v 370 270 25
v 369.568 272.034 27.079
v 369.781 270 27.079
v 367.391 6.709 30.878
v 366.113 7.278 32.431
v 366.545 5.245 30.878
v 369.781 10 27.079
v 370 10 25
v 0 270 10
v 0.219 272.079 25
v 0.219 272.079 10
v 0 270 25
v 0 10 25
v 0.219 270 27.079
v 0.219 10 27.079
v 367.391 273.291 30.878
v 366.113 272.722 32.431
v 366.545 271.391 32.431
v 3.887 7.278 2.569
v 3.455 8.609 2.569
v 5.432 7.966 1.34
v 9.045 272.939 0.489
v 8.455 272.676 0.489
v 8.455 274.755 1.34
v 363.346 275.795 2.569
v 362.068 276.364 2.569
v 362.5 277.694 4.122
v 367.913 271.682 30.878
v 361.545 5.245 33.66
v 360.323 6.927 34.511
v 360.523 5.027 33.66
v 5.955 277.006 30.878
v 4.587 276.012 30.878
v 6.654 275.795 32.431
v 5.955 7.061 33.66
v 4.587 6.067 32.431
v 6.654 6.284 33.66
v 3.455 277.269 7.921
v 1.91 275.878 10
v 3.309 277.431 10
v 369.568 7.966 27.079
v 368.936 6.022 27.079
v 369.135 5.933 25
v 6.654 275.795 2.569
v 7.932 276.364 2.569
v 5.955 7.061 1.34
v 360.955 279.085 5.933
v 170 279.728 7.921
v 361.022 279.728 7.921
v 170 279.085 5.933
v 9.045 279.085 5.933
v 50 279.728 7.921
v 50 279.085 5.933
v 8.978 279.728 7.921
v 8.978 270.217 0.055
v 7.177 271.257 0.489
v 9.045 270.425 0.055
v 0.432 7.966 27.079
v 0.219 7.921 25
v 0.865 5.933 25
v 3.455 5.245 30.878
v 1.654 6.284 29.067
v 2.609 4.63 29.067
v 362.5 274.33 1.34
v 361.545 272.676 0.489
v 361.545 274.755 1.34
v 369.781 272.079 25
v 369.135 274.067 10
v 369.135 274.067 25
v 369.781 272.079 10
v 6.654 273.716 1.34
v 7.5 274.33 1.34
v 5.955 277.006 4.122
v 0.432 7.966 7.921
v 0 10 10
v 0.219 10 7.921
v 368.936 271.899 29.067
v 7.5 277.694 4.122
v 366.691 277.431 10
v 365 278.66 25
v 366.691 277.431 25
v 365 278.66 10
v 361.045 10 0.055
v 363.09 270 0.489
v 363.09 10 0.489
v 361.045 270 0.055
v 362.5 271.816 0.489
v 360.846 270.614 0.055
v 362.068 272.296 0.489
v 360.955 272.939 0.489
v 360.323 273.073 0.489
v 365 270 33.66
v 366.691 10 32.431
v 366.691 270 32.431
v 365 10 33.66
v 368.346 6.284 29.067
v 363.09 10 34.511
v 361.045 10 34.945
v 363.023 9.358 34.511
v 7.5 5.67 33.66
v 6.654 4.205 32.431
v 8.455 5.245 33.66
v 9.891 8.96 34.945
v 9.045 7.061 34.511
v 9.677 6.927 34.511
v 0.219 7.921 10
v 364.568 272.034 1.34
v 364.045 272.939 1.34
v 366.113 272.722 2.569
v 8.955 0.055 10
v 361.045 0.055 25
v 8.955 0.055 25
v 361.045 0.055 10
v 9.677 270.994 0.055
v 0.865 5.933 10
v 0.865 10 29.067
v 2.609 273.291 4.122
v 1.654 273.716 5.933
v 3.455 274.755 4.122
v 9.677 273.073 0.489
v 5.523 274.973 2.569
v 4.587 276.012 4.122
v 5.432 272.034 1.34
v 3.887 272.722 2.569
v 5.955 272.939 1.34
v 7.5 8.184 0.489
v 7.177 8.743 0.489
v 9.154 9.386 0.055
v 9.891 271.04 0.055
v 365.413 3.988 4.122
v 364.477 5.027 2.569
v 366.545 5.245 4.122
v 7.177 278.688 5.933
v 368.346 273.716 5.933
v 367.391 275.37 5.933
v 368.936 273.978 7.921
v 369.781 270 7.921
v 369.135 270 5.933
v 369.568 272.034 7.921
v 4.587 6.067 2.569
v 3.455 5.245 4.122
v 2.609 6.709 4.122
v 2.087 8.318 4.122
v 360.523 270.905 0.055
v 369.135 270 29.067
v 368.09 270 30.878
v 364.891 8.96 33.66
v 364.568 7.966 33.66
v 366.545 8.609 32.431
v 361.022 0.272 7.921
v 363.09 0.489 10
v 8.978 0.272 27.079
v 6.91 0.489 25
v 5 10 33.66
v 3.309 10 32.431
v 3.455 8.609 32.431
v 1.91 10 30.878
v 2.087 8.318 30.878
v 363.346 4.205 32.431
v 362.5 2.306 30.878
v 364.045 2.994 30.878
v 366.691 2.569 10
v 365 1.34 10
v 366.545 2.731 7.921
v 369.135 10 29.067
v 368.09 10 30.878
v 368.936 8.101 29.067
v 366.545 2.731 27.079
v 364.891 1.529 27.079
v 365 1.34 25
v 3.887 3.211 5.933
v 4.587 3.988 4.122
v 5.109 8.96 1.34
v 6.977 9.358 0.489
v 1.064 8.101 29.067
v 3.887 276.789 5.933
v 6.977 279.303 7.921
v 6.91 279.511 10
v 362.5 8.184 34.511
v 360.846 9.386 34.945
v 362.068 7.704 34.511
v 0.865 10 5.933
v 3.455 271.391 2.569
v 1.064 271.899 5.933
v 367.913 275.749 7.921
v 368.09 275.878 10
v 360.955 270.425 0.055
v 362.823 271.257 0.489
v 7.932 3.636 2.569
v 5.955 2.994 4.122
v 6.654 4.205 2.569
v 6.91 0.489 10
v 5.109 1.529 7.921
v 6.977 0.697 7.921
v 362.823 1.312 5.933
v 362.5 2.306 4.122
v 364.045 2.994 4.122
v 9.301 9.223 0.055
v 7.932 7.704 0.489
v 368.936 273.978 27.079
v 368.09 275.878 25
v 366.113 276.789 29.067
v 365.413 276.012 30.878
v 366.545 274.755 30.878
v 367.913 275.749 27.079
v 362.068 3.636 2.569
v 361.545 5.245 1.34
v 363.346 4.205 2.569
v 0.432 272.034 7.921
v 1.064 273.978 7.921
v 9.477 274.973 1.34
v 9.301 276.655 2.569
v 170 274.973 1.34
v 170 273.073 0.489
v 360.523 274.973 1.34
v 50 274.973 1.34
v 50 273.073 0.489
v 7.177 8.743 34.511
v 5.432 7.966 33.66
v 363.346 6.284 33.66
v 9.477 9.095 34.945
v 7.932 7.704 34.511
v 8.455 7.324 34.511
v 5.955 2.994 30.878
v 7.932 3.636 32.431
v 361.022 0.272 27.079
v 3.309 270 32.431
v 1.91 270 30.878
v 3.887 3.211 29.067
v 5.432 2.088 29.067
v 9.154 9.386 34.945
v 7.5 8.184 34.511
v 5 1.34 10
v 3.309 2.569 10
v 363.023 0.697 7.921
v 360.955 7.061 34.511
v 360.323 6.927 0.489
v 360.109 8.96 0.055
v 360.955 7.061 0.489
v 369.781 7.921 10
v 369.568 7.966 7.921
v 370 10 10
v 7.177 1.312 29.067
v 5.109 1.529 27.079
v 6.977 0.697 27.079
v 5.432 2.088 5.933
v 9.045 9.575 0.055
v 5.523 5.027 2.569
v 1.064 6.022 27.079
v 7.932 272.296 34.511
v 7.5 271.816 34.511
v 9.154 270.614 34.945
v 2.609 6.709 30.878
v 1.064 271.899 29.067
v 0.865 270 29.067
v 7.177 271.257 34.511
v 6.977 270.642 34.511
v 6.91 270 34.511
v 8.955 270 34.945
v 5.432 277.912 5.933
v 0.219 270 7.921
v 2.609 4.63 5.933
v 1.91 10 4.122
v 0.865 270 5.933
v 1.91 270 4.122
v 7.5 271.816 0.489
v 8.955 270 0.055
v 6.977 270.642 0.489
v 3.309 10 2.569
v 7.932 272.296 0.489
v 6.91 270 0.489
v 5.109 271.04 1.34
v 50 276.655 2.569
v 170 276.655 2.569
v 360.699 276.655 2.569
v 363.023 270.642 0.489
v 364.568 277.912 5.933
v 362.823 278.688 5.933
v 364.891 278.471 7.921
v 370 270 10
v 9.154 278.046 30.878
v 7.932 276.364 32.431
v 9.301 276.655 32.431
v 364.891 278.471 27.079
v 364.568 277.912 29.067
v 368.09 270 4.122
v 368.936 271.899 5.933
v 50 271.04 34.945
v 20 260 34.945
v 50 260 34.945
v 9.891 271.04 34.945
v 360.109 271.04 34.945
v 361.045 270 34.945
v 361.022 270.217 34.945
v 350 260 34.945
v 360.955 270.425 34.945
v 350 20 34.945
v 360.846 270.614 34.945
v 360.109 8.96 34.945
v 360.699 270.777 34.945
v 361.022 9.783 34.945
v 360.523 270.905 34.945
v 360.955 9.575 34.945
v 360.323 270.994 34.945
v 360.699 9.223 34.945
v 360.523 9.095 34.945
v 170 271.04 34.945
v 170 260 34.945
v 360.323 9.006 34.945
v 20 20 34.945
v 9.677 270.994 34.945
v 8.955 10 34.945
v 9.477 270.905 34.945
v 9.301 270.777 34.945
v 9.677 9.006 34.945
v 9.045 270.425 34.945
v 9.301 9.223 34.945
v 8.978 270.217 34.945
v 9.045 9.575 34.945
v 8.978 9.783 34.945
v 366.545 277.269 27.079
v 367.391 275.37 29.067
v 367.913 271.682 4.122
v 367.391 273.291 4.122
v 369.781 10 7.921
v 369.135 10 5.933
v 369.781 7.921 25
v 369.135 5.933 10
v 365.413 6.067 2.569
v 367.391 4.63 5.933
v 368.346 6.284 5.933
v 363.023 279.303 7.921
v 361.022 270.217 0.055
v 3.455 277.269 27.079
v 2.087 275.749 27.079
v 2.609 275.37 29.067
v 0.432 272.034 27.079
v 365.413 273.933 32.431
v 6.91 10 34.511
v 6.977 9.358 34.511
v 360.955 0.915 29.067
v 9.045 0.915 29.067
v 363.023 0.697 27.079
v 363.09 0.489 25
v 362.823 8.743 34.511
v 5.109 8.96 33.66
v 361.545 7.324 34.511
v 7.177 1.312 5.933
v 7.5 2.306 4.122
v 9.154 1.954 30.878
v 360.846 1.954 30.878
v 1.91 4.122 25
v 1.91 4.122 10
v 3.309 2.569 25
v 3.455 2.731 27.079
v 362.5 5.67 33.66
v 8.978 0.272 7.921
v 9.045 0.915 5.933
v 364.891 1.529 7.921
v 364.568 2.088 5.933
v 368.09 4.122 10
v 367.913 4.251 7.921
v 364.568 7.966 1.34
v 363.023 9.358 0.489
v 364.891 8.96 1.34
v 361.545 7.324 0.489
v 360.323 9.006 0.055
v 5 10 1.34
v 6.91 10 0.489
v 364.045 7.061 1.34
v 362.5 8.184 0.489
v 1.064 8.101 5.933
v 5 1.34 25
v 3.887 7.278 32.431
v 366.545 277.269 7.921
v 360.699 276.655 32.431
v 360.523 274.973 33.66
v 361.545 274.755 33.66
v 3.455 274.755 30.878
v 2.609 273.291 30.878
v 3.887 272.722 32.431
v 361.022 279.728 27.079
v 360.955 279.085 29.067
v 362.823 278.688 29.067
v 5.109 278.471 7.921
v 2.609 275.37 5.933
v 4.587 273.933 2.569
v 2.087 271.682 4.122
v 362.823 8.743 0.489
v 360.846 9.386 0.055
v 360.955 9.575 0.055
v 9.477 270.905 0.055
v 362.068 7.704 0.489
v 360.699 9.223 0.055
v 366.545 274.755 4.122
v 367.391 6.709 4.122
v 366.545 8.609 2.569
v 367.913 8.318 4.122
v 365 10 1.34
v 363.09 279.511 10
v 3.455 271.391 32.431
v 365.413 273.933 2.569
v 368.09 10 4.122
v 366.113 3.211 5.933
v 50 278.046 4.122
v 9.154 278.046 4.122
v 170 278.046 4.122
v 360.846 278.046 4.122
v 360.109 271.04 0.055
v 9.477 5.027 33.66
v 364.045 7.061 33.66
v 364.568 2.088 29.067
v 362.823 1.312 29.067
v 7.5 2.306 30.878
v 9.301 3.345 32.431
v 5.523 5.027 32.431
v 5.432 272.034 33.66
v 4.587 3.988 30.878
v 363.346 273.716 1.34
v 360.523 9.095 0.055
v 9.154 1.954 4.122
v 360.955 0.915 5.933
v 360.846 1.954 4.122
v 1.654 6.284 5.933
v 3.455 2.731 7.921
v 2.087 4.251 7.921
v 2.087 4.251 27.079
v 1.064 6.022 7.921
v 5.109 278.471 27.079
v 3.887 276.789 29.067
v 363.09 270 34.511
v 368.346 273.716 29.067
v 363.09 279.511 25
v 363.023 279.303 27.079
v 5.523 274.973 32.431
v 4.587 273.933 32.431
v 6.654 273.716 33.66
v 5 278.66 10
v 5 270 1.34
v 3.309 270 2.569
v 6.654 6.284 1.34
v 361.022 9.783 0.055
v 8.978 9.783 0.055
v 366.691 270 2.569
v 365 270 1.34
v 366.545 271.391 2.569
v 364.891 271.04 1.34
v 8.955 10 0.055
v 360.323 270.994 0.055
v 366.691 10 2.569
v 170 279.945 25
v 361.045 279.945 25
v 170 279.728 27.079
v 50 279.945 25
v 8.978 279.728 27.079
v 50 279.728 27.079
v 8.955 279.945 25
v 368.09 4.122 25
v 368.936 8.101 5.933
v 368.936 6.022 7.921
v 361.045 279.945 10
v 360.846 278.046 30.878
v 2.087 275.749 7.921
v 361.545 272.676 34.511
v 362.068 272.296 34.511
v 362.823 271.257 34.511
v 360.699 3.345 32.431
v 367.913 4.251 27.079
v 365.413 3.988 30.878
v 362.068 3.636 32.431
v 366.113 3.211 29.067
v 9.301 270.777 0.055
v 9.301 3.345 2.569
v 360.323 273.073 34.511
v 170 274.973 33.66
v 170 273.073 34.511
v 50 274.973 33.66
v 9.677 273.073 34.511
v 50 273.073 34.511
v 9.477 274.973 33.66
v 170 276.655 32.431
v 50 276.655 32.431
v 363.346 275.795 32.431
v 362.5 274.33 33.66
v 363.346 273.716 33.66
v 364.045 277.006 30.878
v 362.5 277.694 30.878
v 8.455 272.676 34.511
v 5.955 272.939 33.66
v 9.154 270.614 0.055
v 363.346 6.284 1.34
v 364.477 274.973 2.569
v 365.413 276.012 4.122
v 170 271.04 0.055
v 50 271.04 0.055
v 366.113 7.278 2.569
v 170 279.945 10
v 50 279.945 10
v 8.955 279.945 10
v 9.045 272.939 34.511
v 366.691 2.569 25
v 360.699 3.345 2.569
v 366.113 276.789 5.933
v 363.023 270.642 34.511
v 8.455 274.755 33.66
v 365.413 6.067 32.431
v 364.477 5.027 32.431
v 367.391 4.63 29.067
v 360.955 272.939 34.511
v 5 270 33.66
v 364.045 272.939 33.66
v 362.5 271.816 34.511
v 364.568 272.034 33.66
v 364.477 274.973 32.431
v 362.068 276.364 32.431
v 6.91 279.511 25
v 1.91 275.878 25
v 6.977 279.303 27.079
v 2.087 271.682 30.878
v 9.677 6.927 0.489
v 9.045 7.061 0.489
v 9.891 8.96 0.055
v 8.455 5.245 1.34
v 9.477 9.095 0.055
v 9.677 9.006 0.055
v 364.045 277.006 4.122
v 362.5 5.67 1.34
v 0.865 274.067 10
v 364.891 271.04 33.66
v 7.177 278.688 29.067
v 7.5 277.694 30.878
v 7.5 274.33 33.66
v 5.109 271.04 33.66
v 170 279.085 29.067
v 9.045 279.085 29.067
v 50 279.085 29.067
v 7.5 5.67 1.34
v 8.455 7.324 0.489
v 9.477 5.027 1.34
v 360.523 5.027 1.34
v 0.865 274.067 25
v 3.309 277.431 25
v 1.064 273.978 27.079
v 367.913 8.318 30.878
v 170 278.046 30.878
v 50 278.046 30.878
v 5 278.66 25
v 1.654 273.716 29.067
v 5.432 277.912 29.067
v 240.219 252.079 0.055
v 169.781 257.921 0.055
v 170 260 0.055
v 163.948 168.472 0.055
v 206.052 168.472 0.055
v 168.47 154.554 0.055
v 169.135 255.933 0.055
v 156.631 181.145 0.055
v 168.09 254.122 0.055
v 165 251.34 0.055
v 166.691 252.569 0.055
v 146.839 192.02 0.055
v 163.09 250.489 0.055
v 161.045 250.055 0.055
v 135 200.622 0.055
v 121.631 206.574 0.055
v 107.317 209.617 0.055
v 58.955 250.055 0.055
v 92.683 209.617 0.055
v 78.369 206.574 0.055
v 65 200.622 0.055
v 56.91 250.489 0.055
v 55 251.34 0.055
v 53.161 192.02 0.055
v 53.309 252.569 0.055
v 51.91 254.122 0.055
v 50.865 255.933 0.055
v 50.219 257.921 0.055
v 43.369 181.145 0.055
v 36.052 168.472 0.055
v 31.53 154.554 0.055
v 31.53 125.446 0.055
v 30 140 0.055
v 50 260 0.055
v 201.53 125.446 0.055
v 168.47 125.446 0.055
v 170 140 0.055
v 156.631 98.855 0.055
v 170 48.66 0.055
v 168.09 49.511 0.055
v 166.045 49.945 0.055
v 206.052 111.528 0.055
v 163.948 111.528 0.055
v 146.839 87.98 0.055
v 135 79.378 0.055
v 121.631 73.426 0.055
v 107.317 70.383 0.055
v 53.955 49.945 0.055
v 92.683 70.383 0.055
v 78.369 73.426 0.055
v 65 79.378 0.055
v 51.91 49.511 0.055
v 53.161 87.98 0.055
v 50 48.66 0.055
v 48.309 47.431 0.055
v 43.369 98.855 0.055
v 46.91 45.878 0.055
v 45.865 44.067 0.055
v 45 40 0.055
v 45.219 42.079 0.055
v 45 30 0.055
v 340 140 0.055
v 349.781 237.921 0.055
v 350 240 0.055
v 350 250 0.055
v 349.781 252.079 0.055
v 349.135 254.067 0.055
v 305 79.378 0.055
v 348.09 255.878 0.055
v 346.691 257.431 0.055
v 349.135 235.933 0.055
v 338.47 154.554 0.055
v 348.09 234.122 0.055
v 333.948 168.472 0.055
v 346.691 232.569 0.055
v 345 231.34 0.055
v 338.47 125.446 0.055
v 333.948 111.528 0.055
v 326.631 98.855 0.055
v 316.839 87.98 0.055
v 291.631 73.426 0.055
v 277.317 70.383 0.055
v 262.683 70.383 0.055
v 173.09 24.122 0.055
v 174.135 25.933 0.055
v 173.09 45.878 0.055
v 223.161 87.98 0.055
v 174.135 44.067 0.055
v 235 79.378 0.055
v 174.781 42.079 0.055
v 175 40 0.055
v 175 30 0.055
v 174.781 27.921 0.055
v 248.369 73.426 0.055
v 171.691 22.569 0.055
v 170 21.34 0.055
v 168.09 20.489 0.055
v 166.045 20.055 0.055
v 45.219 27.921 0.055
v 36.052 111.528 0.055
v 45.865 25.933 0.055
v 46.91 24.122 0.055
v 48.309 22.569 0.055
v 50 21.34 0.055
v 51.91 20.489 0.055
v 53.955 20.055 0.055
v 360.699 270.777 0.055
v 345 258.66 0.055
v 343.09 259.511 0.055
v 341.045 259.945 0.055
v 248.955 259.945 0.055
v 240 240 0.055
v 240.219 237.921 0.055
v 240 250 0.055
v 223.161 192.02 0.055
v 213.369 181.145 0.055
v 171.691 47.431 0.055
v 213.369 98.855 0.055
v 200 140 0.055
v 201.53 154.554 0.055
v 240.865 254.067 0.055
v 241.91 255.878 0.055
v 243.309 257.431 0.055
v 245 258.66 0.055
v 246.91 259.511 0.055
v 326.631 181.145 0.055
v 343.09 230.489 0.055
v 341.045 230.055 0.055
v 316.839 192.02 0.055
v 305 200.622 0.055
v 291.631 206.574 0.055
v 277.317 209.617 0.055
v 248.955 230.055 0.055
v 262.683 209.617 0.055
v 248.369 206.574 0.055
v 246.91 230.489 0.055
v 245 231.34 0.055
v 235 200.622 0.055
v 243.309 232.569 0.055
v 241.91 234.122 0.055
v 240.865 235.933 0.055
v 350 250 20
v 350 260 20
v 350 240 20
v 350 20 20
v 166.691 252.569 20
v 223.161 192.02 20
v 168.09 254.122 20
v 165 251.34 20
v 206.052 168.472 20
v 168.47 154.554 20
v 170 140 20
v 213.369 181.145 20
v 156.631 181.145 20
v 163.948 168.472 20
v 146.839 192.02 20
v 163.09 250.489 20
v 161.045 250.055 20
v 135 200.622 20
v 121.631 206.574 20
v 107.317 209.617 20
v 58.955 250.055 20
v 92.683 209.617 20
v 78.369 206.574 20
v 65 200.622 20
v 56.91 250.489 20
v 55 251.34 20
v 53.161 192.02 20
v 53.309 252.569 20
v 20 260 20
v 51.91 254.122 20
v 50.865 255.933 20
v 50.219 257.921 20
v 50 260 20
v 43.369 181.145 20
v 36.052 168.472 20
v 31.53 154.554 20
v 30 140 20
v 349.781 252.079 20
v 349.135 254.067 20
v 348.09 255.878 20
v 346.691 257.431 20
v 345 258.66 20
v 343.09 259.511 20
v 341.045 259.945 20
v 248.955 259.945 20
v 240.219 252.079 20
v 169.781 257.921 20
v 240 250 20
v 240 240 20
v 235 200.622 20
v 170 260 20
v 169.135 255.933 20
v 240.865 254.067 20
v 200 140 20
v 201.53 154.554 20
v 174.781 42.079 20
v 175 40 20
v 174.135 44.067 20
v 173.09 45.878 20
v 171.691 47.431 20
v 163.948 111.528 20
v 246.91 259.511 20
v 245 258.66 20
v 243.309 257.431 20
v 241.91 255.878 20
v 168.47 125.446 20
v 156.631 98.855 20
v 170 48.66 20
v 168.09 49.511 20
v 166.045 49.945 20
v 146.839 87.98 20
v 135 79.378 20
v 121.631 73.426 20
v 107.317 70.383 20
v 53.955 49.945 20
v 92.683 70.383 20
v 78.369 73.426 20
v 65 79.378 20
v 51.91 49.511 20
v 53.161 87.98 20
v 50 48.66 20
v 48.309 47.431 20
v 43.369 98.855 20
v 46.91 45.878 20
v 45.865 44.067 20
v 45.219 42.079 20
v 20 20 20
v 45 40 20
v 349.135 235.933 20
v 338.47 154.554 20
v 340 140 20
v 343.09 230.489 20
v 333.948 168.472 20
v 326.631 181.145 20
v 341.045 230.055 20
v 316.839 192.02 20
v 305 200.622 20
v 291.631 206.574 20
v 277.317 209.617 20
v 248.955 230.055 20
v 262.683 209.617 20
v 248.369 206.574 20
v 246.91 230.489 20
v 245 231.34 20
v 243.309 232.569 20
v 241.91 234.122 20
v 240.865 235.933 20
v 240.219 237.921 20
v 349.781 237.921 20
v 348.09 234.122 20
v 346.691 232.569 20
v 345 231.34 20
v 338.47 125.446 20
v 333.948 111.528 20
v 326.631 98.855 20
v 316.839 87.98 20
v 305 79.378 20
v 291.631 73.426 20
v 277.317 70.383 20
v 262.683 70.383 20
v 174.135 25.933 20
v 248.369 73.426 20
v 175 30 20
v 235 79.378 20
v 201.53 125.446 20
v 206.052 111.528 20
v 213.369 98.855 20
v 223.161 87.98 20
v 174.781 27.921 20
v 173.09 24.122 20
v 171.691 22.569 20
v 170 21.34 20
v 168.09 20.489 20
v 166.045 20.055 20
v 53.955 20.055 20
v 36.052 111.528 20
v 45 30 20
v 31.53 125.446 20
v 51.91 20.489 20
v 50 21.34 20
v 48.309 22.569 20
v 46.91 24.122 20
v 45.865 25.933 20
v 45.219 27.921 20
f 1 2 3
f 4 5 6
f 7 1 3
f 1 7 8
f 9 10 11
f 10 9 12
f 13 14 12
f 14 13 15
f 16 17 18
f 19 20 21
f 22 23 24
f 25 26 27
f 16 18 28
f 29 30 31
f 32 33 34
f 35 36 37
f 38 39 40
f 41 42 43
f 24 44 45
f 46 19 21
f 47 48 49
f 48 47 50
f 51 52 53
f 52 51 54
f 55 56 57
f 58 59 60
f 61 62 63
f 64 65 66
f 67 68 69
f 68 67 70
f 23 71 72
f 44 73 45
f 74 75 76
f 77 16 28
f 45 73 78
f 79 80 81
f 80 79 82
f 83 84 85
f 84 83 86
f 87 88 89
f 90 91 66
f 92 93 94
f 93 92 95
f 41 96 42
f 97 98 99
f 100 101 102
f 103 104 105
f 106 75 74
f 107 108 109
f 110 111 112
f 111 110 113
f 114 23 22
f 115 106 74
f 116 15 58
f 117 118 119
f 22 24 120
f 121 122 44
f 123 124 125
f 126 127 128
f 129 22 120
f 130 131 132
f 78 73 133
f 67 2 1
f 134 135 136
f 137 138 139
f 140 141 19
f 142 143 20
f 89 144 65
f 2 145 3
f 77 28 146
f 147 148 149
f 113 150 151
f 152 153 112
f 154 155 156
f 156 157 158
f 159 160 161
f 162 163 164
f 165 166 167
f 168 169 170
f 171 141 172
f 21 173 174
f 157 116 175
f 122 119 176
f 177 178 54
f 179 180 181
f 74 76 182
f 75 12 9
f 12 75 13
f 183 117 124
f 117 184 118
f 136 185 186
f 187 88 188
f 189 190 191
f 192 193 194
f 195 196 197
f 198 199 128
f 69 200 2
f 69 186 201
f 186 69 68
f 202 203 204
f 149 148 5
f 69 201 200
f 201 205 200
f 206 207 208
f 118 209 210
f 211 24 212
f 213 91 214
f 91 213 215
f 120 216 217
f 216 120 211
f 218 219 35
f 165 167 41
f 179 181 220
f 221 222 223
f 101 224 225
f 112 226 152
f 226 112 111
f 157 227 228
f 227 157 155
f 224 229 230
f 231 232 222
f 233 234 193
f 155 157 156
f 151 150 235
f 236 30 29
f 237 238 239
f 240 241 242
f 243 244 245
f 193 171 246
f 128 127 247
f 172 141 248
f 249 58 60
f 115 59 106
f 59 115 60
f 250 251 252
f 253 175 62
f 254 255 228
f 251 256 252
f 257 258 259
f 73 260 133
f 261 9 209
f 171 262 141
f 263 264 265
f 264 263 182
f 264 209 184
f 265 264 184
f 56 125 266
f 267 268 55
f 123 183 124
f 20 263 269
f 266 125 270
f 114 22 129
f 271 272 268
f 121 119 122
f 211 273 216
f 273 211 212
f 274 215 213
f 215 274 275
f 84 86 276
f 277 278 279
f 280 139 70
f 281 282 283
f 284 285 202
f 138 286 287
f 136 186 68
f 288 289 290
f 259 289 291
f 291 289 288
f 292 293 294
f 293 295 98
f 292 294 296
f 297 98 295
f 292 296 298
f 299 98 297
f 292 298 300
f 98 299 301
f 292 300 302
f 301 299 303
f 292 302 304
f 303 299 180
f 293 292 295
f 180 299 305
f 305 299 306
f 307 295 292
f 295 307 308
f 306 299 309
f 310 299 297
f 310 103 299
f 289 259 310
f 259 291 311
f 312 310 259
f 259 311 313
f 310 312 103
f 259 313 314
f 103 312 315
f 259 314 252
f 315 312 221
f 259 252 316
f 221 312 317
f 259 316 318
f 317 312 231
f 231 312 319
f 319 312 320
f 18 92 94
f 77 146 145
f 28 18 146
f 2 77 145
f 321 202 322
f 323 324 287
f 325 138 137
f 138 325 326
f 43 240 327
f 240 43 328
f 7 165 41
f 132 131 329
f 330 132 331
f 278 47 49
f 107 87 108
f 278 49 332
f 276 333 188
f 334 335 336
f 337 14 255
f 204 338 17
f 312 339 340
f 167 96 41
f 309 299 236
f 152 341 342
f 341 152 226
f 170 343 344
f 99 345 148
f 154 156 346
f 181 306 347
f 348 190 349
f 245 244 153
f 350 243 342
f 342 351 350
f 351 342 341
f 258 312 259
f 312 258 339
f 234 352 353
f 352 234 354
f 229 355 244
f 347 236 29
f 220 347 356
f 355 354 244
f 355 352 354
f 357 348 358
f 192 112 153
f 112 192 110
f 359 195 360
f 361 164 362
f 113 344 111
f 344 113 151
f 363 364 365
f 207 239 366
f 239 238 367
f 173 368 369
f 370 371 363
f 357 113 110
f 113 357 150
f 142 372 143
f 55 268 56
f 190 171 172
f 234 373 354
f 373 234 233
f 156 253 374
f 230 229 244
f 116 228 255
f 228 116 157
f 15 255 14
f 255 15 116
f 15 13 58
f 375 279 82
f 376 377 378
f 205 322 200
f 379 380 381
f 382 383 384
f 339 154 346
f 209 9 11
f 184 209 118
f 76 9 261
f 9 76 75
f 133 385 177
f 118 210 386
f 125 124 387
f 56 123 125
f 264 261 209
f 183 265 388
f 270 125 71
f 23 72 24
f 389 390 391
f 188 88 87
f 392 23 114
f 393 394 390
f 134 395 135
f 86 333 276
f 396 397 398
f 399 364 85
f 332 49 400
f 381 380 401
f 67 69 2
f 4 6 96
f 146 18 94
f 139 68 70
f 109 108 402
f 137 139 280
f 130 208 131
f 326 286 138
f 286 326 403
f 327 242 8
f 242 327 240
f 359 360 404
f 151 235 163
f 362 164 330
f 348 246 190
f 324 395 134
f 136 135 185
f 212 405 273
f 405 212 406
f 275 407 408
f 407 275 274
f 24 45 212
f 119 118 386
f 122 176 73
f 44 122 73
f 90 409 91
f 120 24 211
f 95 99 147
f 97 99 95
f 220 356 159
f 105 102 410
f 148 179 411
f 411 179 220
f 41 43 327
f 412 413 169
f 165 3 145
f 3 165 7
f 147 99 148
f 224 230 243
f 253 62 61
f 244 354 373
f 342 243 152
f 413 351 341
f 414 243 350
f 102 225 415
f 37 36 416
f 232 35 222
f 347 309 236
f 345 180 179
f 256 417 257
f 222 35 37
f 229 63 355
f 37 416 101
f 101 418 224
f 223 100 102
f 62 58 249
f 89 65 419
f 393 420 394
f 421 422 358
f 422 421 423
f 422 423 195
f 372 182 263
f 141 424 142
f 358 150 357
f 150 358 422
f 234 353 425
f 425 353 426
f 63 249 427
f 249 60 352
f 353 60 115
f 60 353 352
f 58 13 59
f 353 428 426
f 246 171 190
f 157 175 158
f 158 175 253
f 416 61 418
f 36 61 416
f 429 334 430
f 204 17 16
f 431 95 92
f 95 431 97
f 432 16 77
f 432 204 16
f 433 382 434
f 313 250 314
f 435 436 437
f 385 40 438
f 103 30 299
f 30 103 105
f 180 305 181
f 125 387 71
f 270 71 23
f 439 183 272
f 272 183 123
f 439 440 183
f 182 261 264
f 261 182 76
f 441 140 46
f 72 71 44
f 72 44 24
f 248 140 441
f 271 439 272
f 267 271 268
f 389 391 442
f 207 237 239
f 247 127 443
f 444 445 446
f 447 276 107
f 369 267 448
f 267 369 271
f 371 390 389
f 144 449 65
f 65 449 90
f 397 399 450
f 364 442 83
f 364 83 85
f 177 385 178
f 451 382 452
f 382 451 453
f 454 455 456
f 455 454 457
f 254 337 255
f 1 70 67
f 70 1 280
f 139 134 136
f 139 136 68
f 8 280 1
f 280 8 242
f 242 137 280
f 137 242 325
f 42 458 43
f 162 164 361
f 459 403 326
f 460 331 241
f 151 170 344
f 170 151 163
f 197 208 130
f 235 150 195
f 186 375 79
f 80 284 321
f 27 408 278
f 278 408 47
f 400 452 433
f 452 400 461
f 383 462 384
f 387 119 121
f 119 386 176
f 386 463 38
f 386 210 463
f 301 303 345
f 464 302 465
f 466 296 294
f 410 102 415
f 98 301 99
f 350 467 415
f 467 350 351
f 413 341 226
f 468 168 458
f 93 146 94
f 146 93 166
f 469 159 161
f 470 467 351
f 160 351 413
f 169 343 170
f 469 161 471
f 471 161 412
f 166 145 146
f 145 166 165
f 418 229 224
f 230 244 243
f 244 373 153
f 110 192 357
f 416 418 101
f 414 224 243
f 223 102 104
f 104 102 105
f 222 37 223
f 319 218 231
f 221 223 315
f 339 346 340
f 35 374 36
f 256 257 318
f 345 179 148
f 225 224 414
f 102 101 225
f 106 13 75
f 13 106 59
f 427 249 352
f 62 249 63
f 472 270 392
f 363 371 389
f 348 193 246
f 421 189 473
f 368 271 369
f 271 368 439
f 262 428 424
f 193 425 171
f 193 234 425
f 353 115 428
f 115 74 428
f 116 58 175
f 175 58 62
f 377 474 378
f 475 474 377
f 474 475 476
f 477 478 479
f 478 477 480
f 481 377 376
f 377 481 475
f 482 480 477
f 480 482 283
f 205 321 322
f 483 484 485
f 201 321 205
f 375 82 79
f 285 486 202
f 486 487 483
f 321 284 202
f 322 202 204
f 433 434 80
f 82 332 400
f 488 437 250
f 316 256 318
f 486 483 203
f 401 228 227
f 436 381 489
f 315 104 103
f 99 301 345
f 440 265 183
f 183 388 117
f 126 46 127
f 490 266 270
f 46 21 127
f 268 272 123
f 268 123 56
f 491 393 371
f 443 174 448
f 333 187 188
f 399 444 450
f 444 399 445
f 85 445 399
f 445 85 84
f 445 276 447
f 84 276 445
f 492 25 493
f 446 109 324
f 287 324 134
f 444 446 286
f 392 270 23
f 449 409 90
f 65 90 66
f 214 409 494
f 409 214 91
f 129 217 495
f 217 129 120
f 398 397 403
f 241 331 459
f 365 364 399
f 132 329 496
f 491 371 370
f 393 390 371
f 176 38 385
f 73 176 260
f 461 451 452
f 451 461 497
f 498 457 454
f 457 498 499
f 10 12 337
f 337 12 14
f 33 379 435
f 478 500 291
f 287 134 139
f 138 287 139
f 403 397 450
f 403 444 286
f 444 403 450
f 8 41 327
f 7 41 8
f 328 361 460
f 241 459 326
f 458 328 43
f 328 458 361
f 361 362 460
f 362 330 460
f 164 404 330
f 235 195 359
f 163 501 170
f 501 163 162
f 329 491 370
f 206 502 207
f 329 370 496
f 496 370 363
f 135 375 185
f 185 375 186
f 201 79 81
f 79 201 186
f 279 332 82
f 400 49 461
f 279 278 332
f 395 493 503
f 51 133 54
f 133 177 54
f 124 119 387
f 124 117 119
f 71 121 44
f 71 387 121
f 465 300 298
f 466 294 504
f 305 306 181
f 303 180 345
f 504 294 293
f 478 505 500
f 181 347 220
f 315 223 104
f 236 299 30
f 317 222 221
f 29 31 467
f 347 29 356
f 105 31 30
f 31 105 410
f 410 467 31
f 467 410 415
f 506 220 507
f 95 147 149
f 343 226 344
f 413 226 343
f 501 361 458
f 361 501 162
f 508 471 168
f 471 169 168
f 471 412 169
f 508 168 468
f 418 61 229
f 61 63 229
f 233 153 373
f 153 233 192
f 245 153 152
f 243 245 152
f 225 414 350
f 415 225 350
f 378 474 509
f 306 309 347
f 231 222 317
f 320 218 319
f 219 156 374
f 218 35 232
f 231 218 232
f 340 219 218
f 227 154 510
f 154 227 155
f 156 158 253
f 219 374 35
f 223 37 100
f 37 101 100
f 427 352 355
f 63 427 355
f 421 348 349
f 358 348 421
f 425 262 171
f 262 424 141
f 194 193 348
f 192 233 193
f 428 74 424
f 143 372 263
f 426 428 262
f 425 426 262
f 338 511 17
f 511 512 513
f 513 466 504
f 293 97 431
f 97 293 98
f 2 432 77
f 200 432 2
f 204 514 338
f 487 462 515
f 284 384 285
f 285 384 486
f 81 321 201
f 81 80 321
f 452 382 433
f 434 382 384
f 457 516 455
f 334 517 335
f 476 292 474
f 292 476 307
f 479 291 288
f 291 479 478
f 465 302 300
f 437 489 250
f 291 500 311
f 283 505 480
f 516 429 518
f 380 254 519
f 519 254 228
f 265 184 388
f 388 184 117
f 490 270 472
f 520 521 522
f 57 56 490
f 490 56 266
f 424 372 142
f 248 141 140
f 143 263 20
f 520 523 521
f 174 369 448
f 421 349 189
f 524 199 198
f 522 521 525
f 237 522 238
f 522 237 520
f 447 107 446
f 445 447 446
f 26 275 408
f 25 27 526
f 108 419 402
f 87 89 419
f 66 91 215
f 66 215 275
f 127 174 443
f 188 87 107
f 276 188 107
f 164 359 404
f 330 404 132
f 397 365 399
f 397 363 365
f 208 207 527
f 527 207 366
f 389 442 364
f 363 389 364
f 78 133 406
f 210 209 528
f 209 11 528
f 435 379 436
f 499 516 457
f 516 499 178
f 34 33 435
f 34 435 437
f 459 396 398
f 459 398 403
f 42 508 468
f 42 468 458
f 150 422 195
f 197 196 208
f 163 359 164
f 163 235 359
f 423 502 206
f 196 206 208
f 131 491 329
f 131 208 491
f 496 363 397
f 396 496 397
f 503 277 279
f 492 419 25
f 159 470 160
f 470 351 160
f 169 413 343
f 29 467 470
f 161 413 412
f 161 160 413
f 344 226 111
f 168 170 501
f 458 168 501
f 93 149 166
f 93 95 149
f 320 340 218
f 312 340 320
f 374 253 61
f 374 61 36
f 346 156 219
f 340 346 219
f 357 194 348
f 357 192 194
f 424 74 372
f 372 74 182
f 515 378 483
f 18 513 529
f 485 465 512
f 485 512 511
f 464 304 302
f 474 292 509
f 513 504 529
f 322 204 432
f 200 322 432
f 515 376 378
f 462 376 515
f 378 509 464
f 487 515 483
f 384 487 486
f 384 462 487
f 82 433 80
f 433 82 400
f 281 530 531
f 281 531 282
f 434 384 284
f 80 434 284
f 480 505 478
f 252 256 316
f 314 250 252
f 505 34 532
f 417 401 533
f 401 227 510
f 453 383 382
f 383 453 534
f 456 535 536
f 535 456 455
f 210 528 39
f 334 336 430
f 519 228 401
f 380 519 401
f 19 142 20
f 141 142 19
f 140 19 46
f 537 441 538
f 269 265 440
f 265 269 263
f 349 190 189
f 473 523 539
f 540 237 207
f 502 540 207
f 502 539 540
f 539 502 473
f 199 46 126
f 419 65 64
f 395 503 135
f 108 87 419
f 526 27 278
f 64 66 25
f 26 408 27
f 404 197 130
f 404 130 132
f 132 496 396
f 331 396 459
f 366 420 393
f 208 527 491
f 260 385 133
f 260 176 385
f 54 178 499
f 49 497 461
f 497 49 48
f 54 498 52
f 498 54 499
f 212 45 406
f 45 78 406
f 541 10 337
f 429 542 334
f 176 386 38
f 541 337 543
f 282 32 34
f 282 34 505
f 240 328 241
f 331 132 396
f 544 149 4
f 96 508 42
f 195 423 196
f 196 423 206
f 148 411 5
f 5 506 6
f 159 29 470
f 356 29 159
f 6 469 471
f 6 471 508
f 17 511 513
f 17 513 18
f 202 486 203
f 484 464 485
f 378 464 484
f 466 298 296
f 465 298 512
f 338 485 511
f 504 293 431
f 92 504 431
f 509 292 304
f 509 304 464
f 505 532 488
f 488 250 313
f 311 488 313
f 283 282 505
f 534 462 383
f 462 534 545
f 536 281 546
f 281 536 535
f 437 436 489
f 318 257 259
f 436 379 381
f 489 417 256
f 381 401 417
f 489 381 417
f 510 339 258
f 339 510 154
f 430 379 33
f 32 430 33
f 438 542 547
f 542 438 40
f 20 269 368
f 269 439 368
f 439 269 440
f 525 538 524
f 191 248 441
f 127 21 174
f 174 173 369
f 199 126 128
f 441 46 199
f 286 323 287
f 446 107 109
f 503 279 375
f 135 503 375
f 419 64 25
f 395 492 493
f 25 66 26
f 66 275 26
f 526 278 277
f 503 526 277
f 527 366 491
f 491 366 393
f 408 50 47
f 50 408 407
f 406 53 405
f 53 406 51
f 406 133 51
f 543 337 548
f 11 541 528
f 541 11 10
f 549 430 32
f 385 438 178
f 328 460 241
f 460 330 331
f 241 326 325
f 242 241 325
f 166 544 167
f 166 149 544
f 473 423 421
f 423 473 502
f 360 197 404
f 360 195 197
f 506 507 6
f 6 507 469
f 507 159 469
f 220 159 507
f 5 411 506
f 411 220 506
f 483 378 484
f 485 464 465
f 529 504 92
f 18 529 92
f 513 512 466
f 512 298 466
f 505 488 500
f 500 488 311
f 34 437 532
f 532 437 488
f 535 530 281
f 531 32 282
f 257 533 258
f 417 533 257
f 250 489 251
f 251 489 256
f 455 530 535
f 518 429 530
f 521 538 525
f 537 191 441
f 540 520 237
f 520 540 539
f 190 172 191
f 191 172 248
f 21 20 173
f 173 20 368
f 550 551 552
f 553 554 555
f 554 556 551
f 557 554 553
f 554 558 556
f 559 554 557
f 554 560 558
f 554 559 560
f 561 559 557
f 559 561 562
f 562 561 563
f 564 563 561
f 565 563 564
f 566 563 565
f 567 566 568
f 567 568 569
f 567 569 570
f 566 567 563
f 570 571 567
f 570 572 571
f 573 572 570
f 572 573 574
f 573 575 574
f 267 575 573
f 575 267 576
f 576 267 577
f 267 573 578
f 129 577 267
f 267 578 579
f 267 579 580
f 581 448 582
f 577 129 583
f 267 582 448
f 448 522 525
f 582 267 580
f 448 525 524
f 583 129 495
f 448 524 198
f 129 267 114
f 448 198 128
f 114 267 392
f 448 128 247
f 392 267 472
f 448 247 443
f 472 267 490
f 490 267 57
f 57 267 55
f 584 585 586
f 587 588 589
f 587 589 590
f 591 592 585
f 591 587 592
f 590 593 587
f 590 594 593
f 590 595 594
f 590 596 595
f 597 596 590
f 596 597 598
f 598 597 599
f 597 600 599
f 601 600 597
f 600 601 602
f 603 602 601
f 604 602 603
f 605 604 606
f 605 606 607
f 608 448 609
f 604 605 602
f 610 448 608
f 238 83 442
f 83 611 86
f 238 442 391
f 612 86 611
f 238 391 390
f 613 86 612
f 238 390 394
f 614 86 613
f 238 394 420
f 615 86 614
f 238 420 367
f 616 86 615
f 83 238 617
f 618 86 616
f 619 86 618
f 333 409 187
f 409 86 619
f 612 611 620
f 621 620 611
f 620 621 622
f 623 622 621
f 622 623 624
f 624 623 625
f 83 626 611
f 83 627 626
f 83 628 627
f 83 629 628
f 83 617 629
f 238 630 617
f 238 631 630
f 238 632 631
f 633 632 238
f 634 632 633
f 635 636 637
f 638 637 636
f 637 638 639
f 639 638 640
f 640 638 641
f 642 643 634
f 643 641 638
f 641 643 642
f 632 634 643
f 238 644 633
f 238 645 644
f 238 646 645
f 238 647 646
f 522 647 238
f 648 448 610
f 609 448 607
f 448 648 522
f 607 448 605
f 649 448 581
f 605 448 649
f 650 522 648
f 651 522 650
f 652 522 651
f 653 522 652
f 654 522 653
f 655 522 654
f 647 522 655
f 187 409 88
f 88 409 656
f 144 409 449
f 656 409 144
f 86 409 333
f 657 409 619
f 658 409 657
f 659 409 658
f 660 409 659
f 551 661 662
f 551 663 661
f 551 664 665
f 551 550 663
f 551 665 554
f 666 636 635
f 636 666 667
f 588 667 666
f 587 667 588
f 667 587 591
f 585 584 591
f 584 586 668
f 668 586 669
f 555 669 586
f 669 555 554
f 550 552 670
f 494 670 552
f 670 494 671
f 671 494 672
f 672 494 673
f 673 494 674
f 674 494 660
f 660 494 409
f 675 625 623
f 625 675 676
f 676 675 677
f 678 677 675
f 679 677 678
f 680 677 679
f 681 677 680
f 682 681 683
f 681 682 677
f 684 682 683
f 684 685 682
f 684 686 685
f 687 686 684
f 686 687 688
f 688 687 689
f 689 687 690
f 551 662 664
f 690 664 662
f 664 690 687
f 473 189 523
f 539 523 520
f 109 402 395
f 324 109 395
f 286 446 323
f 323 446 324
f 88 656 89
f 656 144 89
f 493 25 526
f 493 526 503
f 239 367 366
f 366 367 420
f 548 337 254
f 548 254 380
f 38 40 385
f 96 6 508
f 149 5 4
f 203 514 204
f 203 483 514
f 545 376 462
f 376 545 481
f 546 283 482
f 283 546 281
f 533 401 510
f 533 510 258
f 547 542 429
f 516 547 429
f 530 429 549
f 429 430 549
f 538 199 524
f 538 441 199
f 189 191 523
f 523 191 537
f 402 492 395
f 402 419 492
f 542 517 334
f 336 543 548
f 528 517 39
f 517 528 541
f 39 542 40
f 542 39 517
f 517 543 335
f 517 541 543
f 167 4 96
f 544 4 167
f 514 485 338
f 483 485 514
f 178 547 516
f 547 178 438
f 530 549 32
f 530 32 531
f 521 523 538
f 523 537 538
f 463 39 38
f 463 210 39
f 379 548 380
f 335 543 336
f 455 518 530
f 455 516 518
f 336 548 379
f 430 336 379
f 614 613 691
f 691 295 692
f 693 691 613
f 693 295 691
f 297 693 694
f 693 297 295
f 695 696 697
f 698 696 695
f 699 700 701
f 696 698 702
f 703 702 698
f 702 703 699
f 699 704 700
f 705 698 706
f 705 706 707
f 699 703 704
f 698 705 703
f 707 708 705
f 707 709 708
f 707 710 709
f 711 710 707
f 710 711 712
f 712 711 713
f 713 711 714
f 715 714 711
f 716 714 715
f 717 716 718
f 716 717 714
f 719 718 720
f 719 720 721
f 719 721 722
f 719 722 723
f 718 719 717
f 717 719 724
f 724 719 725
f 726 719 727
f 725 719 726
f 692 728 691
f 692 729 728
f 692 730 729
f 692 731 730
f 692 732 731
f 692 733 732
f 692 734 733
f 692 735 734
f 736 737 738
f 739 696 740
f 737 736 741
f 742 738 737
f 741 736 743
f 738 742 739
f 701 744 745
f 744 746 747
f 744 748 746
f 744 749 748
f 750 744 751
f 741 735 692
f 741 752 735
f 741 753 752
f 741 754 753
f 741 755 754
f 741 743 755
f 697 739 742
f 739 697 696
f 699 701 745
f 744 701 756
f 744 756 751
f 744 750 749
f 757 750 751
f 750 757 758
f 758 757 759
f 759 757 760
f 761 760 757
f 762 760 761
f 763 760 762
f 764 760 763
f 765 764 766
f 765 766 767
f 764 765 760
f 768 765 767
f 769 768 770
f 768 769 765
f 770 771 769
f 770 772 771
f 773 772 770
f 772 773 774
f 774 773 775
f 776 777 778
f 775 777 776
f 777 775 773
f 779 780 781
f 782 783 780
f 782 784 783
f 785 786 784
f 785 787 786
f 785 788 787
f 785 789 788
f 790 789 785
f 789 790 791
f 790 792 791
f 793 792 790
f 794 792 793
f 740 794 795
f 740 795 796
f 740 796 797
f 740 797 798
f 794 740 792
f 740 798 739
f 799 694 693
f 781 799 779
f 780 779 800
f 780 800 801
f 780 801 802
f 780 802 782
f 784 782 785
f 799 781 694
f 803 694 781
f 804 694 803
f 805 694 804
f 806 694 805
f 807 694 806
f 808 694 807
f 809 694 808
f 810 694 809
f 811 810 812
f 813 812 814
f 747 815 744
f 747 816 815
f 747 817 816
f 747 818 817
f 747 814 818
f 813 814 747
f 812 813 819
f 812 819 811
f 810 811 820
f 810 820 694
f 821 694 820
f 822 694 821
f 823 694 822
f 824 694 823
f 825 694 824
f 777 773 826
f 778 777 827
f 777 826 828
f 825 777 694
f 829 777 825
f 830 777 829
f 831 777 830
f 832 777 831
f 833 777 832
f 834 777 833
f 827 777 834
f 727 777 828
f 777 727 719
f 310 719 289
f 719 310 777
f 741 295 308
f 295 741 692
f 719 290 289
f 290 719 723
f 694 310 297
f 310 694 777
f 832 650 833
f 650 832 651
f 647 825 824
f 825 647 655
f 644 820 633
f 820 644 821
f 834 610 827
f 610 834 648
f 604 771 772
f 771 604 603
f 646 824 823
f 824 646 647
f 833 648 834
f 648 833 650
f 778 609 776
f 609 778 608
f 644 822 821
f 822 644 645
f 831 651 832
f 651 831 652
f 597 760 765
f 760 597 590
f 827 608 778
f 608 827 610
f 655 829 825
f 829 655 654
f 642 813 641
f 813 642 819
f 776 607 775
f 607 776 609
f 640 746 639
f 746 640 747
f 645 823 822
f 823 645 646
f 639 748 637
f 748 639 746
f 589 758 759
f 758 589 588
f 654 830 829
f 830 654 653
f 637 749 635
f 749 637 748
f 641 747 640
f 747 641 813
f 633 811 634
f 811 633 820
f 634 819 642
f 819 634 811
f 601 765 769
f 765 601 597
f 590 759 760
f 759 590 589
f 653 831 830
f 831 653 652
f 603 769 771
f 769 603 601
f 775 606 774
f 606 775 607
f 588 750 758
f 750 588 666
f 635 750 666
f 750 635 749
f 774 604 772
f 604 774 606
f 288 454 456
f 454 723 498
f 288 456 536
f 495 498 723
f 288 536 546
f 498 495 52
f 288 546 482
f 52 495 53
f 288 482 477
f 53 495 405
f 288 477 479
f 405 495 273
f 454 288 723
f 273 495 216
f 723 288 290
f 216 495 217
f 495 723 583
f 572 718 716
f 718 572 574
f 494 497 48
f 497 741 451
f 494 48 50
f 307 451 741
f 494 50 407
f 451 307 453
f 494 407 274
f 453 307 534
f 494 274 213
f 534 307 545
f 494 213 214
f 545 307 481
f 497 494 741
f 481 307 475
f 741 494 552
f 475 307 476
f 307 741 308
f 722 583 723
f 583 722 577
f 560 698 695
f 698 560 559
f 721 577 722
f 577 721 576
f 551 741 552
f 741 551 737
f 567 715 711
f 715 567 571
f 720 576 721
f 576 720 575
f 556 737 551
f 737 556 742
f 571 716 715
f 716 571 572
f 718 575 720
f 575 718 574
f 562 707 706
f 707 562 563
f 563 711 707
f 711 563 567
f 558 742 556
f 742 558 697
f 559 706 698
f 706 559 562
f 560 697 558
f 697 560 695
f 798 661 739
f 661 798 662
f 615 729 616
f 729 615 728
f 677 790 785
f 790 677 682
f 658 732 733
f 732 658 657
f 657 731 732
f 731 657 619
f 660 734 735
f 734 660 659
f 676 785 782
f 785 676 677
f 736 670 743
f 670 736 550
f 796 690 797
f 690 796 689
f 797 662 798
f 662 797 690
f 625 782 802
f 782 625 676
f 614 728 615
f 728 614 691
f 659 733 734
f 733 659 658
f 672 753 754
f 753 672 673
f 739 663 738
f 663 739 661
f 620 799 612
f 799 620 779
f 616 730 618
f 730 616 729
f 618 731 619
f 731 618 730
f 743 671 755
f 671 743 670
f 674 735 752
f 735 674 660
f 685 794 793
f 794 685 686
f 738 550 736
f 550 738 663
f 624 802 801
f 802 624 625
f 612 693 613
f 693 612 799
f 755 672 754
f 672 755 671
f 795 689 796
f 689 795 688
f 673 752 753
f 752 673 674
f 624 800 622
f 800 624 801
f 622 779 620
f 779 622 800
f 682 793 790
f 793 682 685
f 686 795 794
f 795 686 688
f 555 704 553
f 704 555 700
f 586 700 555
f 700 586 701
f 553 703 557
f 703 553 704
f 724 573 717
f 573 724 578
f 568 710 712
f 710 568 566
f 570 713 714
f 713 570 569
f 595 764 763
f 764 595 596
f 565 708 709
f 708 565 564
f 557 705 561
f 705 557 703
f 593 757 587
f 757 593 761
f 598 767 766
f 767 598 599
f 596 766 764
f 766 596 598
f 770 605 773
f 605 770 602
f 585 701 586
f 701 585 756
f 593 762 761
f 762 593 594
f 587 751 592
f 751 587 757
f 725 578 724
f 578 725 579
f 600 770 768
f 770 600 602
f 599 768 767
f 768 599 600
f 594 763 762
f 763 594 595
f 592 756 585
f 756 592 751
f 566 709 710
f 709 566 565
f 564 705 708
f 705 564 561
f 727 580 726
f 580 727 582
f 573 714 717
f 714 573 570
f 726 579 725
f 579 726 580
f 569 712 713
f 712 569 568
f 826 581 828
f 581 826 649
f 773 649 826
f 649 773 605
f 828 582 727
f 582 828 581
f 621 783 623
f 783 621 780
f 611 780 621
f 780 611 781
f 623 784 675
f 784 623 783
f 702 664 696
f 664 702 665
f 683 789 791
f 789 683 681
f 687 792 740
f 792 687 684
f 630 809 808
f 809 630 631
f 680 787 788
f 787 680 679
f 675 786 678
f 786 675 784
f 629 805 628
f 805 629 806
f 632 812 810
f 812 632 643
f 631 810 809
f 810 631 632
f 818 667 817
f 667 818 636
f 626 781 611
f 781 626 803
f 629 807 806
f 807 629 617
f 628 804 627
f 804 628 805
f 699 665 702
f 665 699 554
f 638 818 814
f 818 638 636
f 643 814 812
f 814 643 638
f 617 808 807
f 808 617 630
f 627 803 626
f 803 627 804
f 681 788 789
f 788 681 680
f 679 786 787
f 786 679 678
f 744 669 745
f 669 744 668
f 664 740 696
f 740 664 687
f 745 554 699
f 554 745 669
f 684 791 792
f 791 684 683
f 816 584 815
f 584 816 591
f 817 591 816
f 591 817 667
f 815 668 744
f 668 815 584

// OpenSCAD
// file: tools_lib.scad
screw8_hole();

translate([0,100,0]) screw8();

translate([100,0,0]) screw4_hole();

translate([100,100,0]) screw4();


module screw8_hole() {
  // screw protrudes 5 clearance
  union() {
    translate([ 0,0,-5]) cylinder(75,12,12);
    translate([0,0,40]) cylinder(40,14,14);
    translate([0,0,80]) cylinder(100,24,24);
  }
}

module screw4_hole() {
  // screw protrudes 5 clearance
  union() {
    translate([ 0,0,-5]) cylinder(35,11,11);
    translate([0,0,30]) cylinder(10,14,14);
    translate([0,0,40]) cylinder(60,24,24);
  }
}


module screw4() {
  color("Silver") {
    difference() {
      union() {
        cylinder(40,13,13);
        translate([0,0,40]) cylinder(20,23,23);
      }
    translate([-15,-3,55]) cube([30,6,6]);
    translate([-3,-15,55]) cube([6,30,6]);
    }
  }
}

module screw8() {
  color("Silver") {
    difference() {
      union() {
        cylinder(80,13,13);
        translate([0,0,80]) cylinder(20,23,23);
      }
    translate([-15,-3,95]) cube([30,6,6]);
    translate([-3,-15,95]) cube([6,30,6]);
    }
  }
}
// file: shapes_lib.scad
rounded_cube(100,200,30,10,30);
%cube([100,200,30]);

translate([200,0,0]) rounded_cylinder(100, 40, 10);
%translate([200,0,0]) cylinder(100, 40, 40);

translate([300,0,0]) edged_cube(100, 200, 50,10);
%translate([300,0,0]) cube([100, 200, 50]);


module rounded_hole(h=100, r=50, c=10) {
  difference() {
    union() {
      translate([0,0,0]) cylinder(c, r+c, r+c);
      translate([0,0,0]) cylinder(h, r, r);
      translate([0,0,h-c]) cylinder(c, r+c, r+c);
    }
    rotate_extrude() translate([r+c, c, 0]) circle(c);
    rotate_extrude() translate([r+c, h-c, 0]) circle(c);
  }
}

module rounded_cylinder(h, r, c) {
  // h = heigth
  // r = radius
  // c = corner radius
  
  union() {
    rotate_extrude() translate([r-c, c, 0]) circle(r = c);
    rotate_extrude() translate([r-c, h-c, 0]) circle(r = c);
    translate([0,0,c]) cylinder(h-2*c, r, r);
    cylinder(h, r-c, r-c);
  }
}

module rounded_base(x,y,z,cr) {
  hull() {
    translate([   cr,   cr, 0 ]) cylinder( z, cr, cr );
    translate([ x-cr,   cr, 0 ]) cylinder( z, cr, cr );
    translate([   cr, y-cr, 0 ]) cylinder( z, cr, cr );
    translate([ x-cr, y-cr, 0 ]) cylinder( z, cr, cr );
  }
}

module edged_cube(x,y,z,er) {
  if (z>=2*er) {
    hull() {
      // bottom spheres
      translate([ er,   er,   er ]) sphere( er );
      translate([ x-er, er,   er ]) sphere( er );
      translate([ er,   y-er, er ]) sphere( er );
      translate([ x-er, y-er, er ]) sphere( er );

      // top spheres
      translate([ er,   er  , z-er ]) sphere( er );
      translate([ x-er, er  , z-er ]) sphere( er );
      translate([ er,   y-er, z-er ]) sphere( er );
      translate([ x-er, y-er, z-er ]) sphere( er );
    }
  } else {
    echo (" z ! >= 2 * er ");
  }
}


module rounded_cube(x,y,z,er,cr) {
  // er = edge radius
  // cr = corner radius
  // er must be smaller than cr

  // X bottom
  rotate([0,90,0]) translate([-er,er,cr+er]) cylinder(x-2*cr-2*er,er,er);
  rotate([0,90,0]) translate([-z+er,er,cr+er]) cylinder(x-2*cr-2*er,er,er);
  // X top
  rotate([0,90,0]) translate([-er,y-er,cr+er]) cylinder(x-2*cr-2*er,er,er);
  rotate([0,90,0]) translate([-z+er,y-er,cr+er]) cylinder(x-2*cr-2*er,er,er);
  // Y left
  rotate([-90,0,0]) translate([er,-er,cr+er]) cylinder(y-2*cr-2*er,er,er);
  rotate([-90,0,0]) translate([er,-z+er,cr+er]) cylinder(y-2*cr-2*er,er,er);
  // Y right
  rotate([-90,0,0]) translate([x-er,-er,cr+er]) cylinder(y-2*cr-2*er,er,er);
  rotate([-90,0,0]) translate([x-er,-z+er,cr+er]) cylinder(y-2*cr-2*er,er,er);
  
  // corner donut
  // bottom left
  translate([cr+er,cr+er,er]) rotate_extrude() translate([cr,0,0]) circle(er);
  translate([cr+er,cr+er,z-er]) rotate_extrude() translate([cr,0,0]) circle(er);
  // top left
  translate([cr+er,y-cr-er,er]) rotate_extrude() translate([cr,0,0]) circle(er);
  translate([cr+er,y-cr-er,z-er]) rotate_extrude() translate([cr,0,0]) circle(er);
  // bottom right
  translate([x-cr-er,cr+er,er]) rotate_extrude() translate([cr,0,0]) circle(er);
  translate([x-cr-er,cr+er,z-er]) rotate_extrude() translate([cr,0,0]) circle(er);
  // top right
  translate([x-cr-er,y-cr-er,er]) rotate_extrude() translate([cr,0,0]) circle(er);
  translate([x-cr-er,y-cr-er,z-er]) rotate_extrude() translate([cr,0,0]) circle(er);
  
  // corner cylinder
  // bottom left
  translate([cr+er,cr+er,er]) cylinder(z-2*er,cr+er,cr+er);
  translate([cr+er,cr+er,0]) cylinder(z,cr,cr);
  // top left
  translate([cr+er,y-cr-er,er]) cylinder(z-2*er,cr+er,cr+er);
  translate([cr+er,y-cr-er,0]) cylinder(z,cr,cr);
  // bottom right
  translate([x-cr-er,cr+er,er]) cylinder(z-2*er,cr+er,cr+er);
  translate([x-cr-er,cr+er,0]) cylinder(z,cr,cr);
  // top right
  translate([x-cr-er,y-cr-er,er]) cylinder(z-2*er,cr+er,cr+er);
  translate([x-cr-er,y-cr-er,0]) cylinder(z,cr,cr);
  
  // center cube
  translate([cr+er,0,er]) cube([x-2*cr-2*er,y,z-2*er]);
  translate([0,cr+er,er]) cube([x,y-2*cr-2*er,z-2*er]);
  translate([er,cr+er,0]) cube([x-2*er,y-2*cr-2*er,z]);
  translate([cr+er,er,0]) cube([x-2*cr-2*er,y-2*er,z]);
}
// main file
use <shapes_lib.scad>
use <tools_lib.scad>

r=25; //chopstick radius

charger();

module charger() {
  difference() {
    union() {
      edged_cube(370,280,35,10);
    }
    translate([20,20,20]) cube([330,240,15]);
    translate([45,20,-10]) edged_cube(130,30,40,10);
    translate([50,250,-10]) edged_cube(120,50,60,10);
    translate([240,230,-10]) edged_cube(110,30,60,10);
    
  translate([100,140,-1]) cylinder(20+2,70,70);
  translate([270,140,-1]) cylinder(20+2,70,70);
  }
}  
